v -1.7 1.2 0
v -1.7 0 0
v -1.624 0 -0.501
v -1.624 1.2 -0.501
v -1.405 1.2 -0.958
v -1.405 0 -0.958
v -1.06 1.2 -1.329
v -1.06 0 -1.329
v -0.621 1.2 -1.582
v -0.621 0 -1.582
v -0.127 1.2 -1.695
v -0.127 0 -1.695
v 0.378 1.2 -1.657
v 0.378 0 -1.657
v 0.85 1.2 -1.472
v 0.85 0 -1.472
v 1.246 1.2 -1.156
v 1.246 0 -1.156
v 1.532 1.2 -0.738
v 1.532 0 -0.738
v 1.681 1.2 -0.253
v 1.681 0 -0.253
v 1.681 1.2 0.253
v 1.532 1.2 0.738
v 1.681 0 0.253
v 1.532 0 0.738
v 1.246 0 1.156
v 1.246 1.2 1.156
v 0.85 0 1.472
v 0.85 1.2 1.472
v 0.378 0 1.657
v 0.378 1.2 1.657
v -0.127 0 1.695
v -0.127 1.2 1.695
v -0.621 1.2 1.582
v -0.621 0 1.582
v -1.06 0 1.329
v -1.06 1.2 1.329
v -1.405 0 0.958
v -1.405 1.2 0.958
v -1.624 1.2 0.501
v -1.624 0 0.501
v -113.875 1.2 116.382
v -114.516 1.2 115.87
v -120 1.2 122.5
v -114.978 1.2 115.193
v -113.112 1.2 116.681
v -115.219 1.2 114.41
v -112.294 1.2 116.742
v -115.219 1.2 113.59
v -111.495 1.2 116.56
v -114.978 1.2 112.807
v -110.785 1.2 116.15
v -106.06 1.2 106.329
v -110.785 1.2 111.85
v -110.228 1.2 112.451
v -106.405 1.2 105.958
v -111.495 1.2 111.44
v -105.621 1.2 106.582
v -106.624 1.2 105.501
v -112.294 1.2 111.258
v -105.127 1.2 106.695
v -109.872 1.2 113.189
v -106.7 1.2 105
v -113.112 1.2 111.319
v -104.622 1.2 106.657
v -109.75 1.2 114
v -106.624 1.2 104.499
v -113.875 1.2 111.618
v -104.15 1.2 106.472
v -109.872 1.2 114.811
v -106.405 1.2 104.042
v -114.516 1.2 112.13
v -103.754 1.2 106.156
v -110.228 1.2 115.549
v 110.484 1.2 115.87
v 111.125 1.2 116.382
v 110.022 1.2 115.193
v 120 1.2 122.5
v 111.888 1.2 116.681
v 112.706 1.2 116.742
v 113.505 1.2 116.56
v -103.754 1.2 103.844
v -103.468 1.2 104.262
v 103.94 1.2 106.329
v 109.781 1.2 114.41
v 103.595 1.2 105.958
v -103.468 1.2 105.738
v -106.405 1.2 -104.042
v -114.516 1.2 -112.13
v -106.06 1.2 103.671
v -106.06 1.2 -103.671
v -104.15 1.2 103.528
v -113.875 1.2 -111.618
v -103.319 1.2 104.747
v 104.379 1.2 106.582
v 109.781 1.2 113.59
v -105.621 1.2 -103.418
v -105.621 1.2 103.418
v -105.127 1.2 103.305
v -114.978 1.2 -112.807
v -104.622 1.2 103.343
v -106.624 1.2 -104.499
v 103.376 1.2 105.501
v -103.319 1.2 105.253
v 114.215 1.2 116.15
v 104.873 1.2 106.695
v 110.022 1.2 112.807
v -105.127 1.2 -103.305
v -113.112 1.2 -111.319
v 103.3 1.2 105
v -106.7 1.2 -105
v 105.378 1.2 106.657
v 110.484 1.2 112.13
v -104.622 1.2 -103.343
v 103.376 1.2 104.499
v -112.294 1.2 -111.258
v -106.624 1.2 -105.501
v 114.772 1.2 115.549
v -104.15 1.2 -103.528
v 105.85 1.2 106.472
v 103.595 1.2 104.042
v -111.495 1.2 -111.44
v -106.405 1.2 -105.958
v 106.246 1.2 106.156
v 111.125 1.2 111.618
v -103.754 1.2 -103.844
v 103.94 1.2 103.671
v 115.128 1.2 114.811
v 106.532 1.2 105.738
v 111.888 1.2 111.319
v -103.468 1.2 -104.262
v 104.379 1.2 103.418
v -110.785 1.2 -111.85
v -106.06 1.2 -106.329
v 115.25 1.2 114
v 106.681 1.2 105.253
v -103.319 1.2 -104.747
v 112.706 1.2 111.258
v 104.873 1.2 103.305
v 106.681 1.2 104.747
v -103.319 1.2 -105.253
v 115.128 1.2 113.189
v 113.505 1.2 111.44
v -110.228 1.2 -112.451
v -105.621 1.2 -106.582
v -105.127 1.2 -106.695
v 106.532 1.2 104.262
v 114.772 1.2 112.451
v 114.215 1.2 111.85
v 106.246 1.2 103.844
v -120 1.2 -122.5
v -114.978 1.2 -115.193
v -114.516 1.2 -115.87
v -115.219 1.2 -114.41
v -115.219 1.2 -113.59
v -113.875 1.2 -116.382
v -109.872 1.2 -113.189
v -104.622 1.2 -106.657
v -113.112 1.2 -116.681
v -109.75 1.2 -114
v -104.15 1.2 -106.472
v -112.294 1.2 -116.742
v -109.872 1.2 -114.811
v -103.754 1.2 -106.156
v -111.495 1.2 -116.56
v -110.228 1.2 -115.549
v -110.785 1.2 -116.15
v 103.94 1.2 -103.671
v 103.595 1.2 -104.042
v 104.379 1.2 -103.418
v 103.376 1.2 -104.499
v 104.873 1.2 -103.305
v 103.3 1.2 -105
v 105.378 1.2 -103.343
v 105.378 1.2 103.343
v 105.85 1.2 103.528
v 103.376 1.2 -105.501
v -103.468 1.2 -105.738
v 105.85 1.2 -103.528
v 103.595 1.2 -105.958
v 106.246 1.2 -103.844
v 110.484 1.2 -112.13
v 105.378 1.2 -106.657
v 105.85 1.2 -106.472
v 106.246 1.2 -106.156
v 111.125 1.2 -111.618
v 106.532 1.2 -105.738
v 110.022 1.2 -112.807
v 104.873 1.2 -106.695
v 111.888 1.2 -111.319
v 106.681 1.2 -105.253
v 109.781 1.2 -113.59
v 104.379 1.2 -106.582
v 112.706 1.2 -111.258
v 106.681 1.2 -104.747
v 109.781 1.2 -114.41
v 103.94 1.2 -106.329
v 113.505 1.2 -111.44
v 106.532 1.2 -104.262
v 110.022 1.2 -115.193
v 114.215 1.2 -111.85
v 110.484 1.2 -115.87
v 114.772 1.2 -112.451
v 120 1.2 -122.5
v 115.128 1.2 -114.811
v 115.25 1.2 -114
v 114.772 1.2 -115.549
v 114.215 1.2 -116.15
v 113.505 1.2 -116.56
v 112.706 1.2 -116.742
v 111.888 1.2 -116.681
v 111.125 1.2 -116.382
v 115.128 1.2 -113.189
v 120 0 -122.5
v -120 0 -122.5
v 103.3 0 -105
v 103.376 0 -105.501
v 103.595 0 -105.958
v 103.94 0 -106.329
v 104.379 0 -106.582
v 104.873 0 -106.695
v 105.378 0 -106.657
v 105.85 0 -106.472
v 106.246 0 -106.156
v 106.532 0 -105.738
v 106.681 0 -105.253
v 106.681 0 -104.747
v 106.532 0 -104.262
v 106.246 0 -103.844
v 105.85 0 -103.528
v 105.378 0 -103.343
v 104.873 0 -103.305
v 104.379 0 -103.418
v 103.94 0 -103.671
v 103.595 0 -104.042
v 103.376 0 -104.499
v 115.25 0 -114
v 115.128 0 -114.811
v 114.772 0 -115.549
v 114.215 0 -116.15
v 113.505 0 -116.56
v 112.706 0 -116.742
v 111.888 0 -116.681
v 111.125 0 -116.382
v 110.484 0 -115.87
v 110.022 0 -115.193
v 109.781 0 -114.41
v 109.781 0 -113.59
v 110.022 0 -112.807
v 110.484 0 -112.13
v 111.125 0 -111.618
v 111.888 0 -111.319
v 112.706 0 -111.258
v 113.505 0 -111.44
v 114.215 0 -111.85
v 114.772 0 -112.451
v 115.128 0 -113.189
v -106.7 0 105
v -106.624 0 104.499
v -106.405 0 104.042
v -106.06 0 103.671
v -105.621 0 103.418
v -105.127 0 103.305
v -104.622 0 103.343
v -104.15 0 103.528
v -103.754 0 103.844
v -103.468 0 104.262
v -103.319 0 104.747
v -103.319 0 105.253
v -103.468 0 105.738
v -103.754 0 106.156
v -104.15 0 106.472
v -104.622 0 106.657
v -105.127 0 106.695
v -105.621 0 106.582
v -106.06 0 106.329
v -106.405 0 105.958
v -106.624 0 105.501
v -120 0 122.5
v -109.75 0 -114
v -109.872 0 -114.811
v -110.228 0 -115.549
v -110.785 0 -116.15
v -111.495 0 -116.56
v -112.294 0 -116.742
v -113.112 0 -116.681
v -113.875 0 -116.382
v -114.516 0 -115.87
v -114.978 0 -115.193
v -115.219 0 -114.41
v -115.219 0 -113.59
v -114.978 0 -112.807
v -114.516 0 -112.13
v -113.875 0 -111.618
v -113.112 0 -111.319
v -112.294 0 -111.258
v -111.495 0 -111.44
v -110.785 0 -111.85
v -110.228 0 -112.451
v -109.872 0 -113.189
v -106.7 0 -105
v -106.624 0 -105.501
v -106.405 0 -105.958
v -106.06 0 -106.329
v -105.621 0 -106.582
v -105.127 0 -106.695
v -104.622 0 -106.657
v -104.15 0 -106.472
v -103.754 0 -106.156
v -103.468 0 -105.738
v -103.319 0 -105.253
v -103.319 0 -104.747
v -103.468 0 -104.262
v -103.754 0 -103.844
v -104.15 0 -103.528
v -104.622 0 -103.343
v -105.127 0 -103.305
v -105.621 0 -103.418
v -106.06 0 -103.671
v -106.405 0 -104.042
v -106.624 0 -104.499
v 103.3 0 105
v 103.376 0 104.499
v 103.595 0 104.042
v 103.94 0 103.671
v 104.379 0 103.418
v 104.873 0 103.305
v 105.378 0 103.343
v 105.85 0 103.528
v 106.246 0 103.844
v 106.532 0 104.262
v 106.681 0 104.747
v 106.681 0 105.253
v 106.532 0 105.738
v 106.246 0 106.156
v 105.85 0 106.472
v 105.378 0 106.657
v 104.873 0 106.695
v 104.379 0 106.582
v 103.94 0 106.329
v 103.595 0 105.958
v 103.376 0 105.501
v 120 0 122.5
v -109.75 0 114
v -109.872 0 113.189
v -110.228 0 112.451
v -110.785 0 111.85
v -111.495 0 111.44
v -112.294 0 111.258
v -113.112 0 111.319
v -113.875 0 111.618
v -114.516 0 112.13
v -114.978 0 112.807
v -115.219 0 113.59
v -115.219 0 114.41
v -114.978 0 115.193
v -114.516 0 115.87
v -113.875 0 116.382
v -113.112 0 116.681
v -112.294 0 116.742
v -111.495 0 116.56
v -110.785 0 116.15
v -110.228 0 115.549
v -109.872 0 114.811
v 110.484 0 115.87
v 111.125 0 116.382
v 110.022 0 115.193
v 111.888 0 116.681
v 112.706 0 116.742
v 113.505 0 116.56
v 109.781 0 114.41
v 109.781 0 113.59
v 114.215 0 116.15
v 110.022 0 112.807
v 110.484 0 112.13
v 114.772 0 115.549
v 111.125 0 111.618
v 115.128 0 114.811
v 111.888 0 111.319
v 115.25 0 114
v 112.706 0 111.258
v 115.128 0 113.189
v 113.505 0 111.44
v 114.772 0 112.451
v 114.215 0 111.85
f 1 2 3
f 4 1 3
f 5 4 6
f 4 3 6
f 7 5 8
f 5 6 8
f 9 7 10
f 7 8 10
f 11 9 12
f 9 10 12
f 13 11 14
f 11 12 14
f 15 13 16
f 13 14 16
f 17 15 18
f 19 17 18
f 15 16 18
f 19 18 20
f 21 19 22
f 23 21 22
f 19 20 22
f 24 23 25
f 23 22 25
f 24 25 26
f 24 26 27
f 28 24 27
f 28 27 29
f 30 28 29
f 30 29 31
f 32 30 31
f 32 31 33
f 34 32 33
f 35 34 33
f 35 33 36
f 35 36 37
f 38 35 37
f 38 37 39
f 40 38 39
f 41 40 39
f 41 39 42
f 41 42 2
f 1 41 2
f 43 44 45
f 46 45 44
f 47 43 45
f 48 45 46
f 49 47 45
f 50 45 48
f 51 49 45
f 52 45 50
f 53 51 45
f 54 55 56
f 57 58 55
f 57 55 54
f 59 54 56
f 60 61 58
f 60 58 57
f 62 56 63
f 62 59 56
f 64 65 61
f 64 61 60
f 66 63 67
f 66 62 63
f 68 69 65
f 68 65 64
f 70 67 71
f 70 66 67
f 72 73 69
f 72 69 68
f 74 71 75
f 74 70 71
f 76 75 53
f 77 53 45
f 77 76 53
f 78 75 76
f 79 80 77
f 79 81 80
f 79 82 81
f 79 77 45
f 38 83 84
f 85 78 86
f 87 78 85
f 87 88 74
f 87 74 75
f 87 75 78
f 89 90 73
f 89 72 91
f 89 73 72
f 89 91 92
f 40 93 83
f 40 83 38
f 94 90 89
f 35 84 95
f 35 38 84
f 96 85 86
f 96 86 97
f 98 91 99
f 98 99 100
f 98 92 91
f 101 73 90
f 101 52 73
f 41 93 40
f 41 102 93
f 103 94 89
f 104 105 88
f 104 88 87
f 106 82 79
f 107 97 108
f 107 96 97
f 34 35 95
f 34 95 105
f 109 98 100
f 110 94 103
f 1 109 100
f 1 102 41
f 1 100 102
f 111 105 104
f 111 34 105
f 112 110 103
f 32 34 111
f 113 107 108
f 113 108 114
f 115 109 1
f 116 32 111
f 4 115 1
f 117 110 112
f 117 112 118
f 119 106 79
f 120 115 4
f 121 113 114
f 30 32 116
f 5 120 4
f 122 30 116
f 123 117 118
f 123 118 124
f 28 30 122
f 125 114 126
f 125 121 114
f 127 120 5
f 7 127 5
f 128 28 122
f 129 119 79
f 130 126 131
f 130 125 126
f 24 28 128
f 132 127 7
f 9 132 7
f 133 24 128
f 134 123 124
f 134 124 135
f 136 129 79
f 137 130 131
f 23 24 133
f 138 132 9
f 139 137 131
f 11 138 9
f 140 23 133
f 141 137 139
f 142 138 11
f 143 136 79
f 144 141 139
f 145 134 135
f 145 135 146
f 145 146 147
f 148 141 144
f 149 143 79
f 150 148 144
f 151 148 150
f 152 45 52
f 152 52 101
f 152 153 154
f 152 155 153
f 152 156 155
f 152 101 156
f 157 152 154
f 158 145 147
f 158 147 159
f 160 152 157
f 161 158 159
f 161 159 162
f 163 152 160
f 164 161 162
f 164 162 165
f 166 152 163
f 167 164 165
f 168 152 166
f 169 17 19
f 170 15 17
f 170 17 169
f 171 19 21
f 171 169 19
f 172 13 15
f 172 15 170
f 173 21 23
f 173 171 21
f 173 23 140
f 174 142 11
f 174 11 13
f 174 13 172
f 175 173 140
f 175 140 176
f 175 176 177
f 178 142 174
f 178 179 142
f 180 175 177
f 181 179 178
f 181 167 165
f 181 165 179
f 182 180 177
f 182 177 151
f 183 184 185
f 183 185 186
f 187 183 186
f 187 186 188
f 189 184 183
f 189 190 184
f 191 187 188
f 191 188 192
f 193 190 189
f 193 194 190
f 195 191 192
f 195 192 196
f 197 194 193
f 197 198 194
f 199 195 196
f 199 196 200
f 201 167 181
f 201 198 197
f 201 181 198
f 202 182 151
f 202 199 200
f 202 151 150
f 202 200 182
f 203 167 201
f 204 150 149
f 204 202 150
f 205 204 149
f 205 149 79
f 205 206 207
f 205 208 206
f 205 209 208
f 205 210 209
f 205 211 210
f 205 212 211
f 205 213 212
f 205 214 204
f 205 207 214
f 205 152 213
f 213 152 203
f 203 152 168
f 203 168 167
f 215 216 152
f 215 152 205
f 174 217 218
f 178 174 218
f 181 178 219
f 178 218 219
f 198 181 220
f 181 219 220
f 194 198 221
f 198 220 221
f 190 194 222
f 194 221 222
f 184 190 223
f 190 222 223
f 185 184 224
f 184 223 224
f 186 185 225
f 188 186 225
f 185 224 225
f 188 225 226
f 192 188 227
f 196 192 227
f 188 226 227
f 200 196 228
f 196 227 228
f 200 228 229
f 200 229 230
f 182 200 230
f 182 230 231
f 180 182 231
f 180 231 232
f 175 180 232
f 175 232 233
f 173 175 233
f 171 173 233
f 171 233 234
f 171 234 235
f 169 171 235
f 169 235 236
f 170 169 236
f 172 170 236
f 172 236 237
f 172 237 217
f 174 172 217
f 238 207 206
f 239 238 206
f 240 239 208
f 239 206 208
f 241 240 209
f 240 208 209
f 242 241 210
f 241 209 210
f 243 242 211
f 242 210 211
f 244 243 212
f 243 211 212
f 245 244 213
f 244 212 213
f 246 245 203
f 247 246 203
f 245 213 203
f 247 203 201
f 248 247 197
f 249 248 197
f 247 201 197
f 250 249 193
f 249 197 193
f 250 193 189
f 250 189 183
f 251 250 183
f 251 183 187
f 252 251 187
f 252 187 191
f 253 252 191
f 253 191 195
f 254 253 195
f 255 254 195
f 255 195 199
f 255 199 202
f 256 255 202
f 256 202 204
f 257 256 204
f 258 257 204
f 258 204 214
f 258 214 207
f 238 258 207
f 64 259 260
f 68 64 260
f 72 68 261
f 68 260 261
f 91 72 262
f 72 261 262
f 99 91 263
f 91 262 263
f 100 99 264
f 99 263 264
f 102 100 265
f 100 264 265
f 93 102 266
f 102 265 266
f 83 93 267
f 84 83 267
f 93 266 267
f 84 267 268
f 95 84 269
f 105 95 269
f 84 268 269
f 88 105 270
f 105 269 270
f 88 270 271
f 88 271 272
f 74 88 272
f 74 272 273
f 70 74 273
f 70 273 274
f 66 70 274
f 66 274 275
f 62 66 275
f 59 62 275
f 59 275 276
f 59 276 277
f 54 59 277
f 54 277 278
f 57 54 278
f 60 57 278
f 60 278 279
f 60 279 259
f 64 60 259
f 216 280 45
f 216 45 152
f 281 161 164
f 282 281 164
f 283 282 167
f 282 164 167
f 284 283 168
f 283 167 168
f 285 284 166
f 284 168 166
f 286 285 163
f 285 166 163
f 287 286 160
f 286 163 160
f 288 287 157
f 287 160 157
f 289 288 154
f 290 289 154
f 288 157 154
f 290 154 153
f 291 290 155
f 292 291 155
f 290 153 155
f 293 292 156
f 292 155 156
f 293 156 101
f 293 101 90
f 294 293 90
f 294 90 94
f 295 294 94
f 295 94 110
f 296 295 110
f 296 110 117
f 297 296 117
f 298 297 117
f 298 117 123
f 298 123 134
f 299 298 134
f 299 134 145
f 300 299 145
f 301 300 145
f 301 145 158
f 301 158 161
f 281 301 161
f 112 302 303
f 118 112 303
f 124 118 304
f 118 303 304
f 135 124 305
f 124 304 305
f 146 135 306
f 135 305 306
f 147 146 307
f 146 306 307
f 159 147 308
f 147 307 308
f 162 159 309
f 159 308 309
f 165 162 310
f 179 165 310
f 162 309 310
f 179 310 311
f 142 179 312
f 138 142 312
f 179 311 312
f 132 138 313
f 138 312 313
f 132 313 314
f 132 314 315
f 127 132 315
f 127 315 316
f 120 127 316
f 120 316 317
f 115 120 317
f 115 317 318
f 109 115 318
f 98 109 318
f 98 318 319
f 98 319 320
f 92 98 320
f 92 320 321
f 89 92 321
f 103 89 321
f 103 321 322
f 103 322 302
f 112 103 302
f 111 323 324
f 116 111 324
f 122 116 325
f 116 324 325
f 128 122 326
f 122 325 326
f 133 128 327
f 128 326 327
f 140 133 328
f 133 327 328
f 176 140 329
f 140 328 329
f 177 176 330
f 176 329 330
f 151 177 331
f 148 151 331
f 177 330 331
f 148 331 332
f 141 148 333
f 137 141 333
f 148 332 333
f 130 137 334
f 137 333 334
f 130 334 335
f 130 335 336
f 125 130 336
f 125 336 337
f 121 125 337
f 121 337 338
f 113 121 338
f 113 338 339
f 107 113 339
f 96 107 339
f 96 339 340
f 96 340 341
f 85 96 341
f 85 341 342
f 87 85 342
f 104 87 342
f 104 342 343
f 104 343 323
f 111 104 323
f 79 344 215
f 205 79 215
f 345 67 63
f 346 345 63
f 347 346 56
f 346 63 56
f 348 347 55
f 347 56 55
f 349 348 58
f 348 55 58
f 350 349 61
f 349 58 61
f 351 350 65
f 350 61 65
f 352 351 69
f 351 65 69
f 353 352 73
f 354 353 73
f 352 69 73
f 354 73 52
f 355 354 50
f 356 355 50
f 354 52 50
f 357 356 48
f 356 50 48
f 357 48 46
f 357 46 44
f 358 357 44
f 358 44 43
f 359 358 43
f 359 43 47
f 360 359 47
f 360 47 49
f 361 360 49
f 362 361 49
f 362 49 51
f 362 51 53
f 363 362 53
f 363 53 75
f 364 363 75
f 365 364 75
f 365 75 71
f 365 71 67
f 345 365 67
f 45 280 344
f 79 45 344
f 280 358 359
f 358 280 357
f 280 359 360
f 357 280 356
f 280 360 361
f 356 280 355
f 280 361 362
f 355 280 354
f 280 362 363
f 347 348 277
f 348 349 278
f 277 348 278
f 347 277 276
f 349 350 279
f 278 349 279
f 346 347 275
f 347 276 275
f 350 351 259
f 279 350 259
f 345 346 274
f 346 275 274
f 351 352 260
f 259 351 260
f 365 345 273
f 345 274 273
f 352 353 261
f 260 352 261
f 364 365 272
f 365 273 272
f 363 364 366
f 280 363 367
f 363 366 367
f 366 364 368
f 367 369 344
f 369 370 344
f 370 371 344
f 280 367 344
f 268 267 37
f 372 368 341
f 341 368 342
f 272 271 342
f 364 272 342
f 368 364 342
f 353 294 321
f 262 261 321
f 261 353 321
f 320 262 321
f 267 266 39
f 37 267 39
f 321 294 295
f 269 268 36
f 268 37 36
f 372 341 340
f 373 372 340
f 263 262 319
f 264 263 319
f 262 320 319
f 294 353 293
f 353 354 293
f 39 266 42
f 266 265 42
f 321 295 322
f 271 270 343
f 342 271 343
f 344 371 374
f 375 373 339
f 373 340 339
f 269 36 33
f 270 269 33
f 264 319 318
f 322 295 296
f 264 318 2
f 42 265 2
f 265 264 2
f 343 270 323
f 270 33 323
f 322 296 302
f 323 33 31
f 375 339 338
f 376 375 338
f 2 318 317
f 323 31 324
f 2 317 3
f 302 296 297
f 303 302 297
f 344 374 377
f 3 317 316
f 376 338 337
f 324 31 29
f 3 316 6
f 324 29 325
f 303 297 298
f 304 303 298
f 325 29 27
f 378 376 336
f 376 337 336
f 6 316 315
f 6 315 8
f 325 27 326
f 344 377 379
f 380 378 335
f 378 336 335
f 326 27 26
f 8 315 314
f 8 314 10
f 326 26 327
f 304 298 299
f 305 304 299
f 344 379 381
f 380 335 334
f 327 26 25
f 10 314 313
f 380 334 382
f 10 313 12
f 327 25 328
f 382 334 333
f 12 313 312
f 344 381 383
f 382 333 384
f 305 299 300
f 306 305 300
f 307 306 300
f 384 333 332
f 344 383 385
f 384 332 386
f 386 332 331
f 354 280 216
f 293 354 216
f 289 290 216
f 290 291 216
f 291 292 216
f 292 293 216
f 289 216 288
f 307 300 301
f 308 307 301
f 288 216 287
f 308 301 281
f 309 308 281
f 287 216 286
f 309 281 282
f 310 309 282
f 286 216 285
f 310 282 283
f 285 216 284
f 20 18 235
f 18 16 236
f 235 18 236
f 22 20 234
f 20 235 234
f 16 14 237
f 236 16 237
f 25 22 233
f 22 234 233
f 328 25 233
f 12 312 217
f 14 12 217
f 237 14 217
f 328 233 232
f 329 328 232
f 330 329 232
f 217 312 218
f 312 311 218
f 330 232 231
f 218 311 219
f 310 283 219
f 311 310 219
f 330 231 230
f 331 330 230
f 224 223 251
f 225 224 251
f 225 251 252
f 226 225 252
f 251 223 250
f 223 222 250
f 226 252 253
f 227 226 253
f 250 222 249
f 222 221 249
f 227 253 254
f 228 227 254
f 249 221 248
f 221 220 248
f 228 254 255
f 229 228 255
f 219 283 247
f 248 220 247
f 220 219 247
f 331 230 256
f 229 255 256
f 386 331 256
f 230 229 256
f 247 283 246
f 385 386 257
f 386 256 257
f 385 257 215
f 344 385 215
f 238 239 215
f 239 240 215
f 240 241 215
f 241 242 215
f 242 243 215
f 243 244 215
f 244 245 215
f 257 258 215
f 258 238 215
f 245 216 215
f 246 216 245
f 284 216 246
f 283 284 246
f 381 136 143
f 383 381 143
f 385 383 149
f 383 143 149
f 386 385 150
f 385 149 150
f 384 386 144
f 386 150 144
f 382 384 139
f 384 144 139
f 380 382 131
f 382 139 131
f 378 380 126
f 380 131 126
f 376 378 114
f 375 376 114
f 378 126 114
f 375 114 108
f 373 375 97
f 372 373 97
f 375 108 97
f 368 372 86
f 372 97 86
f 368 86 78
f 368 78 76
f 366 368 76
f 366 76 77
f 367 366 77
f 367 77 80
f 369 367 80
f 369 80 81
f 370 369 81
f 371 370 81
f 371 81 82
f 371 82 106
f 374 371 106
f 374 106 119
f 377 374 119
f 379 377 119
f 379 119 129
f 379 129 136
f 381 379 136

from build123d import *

# Parameters (mm, degrees)
SKETCH1_W            = 240
SKETCH1_H            = 245
BOSS_EXTRUDE1_DEPTH  = 1.2
M3_CLEARANCE_HOLE1_D = 3.4
M5_CLEARANCE_HOLE1_D = 5.5


with BuildPart() as part:
    # Sketch1 → Boss-Extrude1 (new body)
    with BuildSketch(Plane(origin=(0, 0, 0), x_dir=(1, 0, 0), z_dir=(0, 1, 0))):
        Rectangle(SKETCH1_W, SKETCH1_H)
    extrude(amount=BOSS_EXTRUDE1_DEPTH)

    # M3 Clearance Hole1 (through all)
    with Locations(Plane(origin=(0, 1.2, 0), x_dir=(1, 0, 0), z_dir=(0, 1, 0))):
        with Locations((0, 0), (105, 105), (-105, -105), (-105, 105), (105, -105)):
            Hole(M3_CLEARANCE_HOLE1_D / 2)

    # M5 Clearance Hole1 (through all)
    with Locations(Plane(origin=(0, 0, 0), x_dir=(-1, 0, 0), z_dir=(0, -1, 0))):
        with Locations((-112.5, -114), (112.5, 114), (112.5, -114), (-112.5, 114)):
            Hole(M5_CLEARANCE_HOLE1_D / 2)


solid = part.part
